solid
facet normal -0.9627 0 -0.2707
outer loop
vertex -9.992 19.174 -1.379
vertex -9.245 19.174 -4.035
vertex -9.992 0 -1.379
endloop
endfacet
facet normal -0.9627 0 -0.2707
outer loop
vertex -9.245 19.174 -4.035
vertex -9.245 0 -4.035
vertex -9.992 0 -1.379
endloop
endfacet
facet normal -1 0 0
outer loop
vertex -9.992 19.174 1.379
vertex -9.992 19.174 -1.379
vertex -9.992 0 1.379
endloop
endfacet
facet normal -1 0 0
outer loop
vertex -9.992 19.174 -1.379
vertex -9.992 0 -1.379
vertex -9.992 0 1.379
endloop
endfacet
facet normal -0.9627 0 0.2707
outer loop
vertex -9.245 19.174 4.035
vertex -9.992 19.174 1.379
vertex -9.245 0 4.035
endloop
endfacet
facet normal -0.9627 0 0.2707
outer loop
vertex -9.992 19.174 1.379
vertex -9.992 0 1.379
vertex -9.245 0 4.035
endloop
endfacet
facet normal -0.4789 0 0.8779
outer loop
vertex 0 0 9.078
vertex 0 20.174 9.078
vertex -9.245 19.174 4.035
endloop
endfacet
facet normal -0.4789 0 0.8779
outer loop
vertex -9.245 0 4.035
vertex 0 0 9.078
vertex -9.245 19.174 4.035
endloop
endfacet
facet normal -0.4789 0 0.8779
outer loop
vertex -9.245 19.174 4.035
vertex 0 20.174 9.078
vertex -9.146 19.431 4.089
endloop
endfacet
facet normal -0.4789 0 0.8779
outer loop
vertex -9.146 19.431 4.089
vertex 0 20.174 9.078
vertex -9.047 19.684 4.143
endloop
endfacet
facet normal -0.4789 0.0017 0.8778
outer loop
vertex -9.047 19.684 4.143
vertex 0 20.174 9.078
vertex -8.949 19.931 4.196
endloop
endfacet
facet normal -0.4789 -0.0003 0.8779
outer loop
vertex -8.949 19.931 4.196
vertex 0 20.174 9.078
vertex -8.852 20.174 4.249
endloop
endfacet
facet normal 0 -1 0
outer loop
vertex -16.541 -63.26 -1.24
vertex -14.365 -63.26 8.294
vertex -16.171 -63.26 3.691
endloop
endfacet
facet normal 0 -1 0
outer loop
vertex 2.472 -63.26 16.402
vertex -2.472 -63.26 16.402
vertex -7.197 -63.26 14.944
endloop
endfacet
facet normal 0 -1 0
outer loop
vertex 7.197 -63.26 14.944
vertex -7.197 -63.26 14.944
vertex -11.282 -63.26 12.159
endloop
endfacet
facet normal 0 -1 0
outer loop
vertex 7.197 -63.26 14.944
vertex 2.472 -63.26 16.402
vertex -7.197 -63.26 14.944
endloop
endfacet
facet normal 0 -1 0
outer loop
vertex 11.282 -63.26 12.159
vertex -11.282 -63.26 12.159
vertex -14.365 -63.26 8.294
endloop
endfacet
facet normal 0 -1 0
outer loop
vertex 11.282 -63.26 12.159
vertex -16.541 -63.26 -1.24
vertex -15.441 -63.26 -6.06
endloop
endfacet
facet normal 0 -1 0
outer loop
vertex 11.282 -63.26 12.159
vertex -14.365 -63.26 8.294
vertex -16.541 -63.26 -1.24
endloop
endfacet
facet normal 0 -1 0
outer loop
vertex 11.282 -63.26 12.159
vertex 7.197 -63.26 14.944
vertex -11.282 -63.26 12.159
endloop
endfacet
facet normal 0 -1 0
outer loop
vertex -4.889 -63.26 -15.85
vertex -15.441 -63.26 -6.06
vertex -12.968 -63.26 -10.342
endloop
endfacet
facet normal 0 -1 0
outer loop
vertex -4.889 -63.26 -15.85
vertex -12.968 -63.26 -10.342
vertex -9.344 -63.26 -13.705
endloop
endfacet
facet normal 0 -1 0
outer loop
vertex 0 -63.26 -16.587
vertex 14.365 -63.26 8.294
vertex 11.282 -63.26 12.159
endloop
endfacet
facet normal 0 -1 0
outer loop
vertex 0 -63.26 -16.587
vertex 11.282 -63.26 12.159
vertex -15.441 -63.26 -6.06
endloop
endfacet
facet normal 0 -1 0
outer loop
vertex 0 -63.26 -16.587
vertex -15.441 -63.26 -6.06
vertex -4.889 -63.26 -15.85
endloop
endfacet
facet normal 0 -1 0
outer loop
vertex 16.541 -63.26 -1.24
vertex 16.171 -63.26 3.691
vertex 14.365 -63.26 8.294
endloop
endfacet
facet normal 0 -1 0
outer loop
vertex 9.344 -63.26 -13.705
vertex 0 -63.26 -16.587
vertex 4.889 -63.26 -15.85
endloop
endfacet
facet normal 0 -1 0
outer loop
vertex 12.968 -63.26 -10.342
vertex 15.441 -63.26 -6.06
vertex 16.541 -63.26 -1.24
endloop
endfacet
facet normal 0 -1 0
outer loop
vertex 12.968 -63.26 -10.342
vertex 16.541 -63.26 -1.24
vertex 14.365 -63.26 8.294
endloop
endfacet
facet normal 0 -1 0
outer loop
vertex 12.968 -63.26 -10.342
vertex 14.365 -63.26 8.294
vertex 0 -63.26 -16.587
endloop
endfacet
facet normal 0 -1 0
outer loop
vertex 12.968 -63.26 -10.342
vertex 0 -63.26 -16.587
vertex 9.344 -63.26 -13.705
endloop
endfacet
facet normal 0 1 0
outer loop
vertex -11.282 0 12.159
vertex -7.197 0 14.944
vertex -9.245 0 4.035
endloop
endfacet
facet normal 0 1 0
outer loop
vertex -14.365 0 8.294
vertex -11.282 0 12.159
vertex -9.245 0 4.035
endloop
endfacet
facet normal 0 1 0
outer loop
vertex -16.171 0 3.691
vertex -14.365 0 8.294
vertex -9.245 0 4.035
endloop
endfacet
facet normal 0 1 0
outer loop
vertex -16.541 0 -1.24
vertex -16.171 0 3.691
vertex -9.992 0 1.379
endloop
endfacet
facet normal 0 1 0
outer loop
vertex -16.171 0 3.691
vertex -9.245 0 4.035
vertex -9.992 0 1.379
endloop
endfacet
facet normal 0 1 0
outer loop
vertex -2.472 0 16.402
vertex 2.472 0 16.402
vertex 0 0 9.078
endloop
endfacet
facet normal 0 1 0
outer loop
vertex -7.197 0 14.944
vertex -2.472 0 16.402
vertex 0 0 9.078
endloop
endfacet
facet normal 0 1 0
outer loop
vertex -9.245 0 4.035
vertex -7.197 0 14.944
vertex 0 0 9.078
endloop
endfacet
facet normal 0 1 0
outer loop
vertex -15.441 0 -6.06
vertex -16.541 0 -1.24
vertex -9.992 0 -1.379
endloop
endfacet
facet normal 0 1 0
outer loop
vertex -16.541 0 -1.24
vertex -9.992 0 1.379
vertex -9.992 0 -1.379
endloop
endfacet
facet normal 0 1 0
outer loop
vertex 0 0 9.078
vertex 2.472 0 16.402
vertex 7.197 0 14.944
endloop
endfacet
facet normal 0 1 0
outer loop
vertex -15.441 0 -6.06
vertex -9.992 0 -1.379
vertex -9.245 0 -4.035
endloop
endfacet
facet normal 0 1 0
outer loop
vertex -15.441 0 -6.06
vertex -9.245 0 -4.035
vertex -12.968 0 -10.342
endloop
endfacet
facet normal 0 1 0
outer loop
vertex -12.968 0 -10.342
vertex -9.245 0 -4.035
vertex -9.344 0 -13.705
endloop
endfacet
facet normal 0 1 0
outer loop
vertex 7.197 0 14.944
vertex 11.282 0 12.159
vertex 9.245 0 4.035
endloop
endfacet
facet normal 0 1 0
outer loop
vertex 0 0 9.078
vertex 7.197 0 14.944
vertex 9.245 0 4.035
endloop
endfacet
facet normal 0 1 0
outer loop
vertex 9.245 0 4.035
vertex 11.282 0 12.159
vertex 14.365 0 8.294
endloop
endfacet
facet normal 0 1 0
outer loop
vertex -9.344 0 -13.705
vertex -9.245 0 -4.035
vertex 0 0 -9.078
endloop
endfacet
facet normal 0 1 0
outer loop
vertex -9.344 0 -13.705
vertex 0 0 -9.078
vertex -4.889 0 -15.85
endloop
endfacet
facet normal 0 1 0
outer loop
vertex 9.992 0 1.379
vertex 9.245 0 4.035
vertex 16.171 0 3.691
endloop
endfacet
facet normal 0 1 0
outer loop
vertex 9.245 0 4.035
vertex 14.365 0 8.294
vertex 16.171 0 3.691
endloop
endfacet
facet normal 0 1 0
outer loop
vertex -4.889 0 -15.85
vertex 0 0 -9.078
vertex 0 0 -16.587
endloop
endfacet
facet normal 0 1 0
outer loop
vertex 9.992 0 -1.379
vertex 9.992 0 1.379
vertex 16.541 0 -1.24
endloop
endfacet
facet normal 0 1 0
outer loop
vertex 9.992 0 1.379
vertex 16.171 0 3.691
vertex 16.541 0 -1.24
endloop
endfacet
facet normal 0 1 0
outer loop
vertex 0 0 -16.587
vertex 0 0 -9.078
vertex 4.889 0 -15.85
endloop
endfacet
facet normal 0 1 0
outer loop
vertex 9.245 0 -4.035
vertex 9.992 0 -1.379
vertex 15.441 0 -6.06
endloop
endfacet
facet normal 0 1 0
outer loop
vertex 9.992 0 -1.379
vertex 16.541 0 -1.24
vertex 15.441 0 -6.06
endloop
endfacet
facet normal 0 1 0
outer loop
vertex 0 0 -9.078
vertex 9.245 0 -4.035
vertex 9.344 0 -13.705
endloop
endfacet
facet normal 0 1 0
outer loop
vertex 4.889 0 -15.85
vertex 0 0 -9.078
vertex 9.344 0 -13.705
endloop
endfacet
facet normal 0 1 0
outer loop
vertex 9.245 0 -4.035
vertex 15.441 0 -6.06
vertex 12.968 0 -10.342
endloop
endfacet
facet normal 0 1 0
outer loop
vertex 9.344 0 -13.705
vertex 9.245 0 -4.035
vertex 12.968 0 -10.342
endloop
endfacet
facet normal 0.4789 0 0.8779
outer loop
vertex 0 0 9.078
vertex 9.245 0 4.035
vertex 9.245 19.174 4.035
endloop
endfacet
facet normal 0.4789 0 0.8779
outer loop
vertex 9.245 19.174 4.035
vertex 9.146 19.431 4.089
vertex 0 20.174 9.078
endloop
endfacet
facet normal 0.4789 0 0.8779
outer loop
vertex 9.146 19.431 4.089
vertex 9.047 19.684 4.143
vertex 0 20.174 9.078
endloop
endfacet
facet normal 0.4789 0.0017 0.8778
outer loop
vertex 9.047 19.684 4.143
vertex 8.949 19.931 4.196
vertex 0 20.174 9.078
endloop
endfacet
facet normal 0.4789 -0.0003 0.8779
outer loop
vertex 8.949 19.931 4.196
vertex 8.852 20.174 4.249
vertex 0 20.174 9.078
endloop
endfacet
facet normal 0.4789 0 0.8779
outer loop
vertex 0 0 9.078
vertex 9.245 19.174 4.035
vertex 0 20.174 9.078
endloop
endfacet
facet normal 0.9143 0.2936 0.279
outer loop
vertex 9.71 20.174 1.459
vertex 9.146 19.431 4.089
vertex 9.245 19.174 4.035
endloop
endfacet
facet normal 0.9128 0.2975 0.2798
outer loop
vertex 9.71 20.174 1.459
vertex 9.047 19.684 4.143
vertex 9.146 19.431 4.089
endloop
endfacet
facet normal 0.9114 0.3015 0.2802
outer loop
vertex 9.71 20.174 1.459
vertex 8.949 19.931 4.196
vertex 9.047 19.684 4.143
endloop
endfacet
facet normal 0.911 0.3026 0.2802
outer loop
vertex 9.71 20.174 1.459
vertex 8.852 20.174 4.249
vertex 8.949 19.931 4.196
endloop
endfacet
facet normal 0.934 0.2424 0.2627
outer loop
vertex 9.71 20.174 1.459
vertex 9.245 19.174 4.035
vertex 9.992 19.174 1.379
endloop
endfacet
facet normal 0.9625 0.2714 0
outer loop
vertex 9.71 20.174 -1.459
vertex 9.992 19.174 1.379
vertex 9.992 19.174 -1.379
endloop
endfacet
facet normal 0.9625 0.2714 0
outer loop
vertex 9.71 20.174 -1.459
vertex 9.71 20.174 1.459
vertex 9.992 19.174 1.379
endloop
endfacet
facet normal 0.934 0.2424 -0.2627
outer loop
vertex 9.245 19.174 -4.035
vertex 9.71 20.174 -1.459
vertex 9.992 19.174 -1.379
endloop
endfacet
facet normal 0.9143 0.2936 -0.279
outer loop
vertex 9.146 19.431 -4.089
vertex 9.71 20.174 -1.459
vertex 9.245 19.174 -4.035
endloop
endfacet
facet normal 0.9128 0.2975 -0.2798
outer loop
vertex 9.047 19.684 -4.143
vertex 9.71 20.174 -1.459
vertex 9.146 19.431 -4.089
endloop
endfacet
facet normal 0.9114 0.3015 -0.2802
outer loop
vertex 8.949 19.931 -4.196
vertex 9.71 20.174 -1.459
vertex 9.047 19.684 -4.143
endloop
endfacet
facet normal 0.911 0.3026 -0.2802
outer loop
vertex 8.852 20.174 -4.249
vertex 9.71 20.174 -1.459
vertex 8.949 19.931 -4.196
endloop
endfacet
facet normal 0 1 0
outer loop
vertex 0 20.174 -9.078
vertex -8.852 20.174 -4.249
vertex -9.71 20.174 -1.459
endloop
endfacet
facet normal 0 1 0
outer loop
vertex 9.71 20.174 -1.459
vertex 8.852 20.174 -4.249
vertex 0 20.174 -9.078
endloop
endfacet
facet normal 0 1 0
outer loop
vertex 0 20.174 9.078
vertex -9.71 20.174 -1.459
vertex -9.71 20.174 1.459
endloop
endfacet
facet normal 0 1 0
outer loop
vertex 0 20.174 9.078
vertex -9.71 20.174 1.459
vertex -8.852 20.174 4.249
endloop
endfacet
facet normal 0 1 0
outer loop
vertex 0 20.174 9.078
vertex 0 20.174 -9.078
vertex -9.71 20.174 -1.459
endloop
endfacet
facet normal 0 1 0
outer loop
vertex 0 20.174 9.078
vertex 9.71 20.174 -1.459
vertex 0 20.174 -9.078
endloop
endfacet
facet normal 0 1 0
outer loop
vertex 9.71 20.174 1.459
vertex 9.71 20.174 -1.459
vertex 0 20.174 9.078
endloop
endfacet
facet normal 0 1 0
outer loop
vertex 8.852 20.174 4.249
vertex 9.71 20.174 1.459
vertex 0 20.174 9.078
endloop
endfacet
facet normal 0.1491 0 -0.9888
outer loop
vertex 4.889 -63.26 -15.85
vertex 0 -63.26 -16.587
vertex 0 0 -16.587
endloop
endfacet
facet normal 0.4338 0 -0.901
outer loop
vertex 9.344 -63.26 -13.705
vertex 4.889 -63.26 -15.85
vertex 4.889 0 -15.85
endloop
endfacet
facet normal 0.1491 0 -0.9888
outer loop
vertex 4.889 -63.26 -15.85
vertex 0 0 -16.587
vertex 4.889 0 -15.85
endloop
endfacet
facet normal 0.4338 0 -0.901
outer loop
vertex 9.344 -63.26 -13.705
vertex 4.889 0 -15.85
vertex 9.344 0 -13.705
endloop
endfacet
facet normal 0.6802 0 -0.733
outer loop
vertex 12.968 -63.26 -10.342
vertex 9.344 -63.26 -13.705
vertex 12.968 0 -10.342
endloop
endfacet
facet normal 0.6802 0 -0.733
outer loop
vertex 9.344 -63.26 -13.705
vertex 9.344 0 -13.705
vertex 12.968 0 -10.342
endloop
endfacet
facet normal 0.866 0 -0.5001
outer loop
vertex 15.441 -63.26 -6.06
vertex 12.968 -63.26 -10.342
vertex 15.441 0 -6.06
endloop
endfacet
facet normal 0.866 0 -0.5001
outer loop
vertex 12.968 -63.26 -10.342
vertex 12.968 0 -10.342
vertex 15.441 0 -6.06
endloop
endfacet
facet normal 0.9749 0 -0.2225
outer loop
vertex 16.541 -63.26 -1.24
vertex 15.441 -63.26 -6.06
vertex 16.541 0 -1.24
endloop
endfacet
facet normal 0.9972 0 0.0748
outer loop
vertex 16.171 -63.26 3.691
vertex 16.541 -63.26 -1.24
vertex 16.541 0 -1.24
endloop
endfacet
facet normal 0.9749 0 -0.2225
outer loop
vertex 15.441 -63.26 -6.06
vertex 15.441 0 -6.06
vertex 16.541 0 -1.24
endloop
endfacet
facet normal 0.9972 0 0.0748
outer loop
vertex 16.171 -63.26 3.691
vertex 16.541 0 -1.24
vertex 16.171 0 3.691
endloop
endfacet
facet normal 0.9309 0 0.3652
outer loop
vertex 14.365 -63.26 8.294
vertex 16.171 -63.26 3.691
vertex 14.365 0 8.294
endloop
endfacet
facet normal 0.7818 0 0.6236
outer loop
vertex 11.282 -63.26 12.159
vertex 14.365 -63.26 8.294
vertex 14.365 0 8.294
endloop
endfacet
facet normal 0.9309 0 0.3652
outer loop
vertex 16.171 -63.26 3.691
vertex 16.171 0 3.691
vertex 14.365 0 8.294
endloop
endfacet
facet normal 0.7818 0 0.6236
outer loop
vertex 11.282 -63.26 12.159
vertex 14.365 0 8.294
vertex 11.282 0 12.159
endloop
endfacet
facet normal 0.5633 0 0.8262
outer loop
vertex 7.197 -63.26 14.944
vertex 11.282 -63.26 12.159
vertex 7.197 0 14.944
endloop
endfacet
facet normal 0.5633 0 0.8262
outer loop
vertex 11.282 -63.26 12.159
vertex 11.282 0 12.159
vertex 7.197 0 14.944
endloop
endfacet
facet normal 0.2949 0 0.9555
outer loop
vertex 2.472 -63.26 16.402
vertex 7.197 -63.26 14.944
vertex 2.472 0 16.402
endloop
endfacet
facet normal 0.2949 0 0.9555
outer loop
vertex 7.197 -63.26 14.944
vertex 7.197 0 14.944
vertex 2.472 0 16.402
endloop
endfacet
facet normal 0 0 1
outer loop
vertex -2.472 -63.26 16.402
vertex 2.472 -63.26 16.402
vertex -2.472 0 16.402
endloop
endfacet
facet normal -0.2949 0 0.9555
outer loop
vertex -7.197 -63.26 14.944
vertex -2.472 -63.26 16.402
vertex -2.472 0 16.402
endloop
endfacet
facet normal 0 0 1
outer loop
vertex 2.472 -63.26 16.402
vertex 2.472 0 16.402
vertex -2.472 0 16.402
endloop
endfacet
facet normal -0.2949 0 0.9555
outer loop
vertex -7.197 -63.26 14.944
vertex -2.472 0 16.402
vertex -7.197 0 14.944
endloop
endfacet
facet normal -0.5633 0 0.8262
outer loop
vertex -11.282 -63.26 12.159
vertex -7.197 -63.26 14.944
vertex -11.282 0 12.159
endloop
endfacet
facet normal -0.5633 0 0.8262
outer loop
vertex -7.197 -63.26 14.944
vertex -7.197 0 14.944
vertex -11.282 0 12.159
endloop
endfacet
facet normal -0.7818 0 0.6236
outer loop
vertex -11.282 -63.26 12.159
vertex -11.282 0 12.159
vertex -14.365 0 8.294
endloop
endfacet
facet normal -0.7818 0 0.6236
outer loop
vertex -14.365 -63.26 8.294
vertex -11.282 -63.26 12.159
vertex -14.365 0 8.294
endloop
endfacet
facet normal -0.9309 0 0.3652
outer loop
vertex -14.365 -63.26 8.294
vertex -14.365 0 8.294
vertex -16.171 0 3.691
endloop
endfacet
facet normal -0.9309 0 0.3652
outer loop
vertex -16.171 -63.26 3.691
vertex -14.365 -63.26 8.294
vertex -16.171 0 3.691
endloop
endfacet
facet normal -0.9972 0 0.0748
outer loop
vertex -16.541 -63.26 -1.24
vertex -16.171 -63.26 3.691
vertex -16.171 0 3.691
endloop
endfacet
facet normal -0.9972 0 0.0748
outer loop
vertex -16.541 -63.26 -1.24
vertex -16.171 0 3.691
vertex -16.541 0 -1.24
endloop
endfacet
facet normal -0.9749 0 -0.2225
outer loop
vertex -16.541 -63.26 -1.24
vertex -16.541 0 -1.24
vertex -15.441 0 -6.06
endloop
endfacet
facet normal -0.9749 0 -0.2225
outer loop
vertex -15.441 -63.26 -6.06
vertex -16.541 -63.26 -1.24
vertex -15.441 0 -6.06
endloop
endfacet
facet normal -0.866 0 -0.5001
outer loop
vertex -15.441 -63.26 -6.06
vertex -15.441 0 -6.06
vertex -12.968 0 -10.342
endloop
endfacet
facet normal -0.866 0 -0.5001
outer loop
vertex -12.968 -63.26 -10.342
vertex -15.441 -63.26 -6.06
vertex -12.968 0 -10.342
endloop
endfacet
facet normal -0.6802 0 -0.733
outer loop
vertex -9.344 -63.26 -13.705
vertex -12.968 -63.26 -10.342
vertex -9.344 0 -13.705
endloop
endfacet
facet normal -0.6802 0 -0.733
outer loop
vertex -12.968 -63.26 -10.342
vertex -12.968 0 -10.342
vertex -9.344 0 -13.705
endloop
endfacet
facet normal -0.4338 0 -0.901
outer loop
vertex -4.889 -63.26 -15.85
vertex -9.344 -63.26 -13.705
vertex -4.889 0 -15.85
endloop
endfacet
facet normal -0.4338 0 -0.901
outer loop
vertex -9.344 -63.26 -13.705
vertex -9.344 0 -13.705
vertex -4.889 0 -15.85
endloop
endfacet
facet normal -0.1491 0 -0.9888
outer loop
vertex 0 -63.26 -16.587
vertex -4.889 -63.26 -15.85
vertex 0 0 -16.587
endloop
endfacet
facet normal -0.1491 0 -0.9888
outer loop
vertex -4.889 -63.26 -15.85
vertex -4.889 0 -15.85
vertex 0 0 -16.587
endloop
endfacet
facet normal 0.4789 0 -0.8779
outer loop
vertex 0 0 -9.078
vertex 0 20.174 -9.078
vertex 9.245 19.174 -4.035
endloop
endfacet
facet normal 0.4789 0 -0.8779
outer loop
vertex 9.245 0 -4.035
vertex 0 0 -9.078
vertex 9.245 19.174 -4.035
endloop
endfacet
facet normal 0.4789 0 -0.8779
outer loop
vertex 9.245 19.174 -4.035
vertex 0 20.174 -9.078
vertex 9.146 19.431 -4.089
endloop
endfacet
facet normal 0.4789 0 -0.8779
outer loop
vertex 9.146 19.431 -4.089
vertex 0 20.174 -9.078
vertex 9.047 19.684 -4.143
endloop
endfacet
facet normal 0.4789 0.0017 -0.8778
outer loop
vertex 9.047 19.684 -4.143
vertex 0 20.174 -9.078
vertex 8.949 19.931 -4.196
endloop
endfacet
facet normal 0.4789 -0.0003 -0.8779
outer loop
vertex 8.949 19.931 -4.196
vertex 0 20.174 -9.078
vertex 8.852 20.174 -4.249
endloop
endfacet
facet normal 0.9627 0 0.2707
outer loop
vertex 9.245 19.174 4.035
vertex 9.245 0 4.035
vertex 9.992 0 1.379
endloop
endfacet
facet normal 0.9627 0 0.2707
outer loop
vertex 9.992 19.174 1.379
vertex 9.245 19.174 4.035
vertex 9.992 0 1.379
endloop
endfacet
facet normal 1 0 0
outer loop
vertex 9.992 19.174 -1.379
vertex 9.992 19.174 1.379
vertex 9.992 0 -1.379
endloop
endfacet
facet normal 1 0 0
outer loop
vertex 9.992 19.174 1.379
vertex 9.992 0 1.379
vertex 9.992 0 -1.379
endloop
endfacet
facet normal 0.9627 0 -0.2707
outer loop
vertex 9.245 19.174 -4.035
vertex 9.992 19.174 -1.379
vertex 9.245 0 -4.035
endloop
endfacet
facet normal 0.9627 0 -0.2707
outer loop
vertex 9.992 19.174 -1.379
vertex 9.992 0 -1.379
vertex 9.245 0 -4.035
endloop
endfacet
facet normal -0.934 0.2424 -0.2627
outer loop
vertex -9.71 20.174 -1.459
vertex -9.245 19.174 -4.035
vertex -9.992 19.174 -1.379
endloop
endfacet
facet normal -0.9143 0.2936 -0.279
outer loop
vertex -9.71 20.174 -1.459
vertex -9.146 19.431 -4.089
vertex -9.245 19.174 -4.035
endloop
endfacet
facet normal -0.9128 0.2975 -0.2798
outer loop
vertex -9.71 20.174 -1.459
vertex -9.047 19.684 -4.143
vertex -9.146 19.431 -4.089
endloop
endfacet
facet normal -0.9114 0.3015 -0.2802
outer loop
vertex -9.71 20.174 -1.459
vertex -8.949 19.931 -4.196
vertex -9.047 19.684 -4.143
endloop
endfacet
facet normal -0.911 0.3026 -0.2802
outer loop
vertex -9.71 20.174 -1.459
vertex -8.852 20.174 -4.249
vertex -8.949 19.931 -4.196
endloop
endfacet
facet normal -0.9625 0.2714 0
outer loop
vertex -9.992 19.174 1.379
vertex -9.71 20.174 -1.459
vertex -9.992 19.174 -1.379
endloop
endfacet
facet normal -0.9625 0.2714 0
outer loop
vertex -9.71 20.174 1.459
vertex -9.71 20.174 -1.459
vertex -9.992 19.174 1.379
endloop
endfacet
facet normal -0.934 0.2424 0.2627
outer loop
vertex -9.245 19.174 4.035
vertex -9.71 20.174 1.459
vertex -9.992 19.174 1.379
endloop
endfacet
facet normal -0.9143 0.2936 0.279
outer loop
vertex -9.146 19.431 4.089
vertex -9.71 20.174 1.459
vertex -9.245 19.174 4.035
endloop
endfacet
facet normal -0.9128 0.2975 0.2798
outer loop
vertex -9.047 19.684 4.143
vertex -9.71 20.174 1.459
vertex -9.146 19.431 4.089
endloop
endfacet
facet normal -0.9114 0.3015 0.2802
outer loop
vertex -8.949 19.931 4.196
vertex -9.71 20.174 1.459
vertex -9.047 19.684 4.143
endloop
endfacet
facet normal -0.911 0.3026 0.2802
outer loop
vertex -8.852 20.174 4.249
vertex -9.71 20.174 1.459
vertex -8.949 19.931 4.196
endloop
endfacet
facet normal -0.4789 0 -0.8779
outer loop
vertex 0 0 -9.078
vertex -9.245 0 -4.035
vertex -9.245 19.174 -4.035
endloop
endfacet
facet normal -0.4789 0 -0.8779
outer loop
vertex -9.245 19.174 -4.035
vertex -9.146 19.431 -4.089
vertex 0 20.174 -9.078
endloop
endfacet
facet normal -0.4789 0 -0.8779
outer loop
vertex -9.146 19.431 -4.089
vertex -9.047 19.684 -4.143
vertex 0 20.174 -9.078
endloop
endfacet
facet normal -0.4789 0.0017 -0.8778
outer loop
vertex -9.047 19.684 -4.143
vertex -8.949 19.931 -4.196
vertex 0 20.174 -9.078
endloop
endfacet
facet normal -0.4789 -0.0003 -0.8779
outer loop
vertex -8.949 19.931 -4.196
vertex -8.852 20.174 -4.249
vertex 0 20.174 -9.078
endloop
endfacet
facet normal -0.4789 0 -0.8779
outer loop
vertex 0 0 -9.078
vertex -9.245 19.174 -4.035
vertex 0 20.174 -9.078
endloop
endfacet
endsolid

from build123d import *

# Parameters (mm, degrees)
SKETCH_1_R          = 10.0871205
EXTRUDE_1_DEPTH     = 20.174241
SKETCH_2_R          = 16.5871205
EXTRUDE_2_DEPTH     = 63.26
CHAMFER_1_SIZE      = 1
CHAMFER_1_SIZE2     = 0.267949192
SKETCH_4_OUTSIDE_W  = 54.318
SKETCH_4_OUTSIDE_H  = 54.318
CUT_EXTRUDE_2_DEPTH = 20.174241


with BuildPart() as part:
    # Эскиз1 → Бобышка-Вытянуть1 (new body)
    with BuildSketch(Plane(origin=(0, 0, 0), x_dir=(1, 0, 0), z_dir=(0, 1, 0))):
        Circle(SKETCH_1_R)
    extrude(amount=EXTRUDE_1_DEPTH)

    # Эскиз2 → Бобышка-Вытянуть2 (add)
    with BuildSketch(Plane.XZ):
        Circle(SKETCH_2_R)
    extrude(amount=EXTRUDE_2_DEPTH)

    # Фаска1
    chamfer_1_edges = [part.edges().sort_by_distance(p)[0] for p in [
        (-10.0871205, 20.174241, 0),
    ]]
    chamfer_1_side = [part.faces().sort_by_distance(p)[0] for p in [
        (-10.0871205, 10.0871205, 0),
    ]]
    chamfer(chamfer_1_edges, length=CHAMFER_1_SIZE, length2=CHAMFER_1_SIZE2, reference=chamfer_1_side[0])

    # Эскиз4 outside → Вырез-Вытянуть2 (cut)
    with BuildSketch(Plane(origin=(0, 20.174241, 0), x_dir=(1, 0, 0), z_dir=(0, 1, 0))):
        Rectangle(SKETCH_4_OUTSIDE_W, SKETCH_4_OUTSIDE_H)
        with BuildLine():
            Line((-9.244998647, 4.0348482), (0, 9.07840845))
            Line((0, 9.07840845), (9.244998647, 4.0348482))
            ThreePointArc((9.244998647, 4.0348482), (10.0871205, 0), (9.244998647, -4.0348482))
            Line((9.244998647, -4.0348482), (0, -9.07840845))
            Line((0, -9.07840845), (-9.244998647, -4.0348482))
            ThreePointArc((-9.244998647, -4.0348482), (-10.0871205, 0), (-9.244998647, 4.0348482))
        make_face(mode=Mode.SUBTRACT)
    extrude(amount=-CUT_EXTRUDE_2_DEPTH, mode=Mode.SUBTRACT)


solid = part.part
